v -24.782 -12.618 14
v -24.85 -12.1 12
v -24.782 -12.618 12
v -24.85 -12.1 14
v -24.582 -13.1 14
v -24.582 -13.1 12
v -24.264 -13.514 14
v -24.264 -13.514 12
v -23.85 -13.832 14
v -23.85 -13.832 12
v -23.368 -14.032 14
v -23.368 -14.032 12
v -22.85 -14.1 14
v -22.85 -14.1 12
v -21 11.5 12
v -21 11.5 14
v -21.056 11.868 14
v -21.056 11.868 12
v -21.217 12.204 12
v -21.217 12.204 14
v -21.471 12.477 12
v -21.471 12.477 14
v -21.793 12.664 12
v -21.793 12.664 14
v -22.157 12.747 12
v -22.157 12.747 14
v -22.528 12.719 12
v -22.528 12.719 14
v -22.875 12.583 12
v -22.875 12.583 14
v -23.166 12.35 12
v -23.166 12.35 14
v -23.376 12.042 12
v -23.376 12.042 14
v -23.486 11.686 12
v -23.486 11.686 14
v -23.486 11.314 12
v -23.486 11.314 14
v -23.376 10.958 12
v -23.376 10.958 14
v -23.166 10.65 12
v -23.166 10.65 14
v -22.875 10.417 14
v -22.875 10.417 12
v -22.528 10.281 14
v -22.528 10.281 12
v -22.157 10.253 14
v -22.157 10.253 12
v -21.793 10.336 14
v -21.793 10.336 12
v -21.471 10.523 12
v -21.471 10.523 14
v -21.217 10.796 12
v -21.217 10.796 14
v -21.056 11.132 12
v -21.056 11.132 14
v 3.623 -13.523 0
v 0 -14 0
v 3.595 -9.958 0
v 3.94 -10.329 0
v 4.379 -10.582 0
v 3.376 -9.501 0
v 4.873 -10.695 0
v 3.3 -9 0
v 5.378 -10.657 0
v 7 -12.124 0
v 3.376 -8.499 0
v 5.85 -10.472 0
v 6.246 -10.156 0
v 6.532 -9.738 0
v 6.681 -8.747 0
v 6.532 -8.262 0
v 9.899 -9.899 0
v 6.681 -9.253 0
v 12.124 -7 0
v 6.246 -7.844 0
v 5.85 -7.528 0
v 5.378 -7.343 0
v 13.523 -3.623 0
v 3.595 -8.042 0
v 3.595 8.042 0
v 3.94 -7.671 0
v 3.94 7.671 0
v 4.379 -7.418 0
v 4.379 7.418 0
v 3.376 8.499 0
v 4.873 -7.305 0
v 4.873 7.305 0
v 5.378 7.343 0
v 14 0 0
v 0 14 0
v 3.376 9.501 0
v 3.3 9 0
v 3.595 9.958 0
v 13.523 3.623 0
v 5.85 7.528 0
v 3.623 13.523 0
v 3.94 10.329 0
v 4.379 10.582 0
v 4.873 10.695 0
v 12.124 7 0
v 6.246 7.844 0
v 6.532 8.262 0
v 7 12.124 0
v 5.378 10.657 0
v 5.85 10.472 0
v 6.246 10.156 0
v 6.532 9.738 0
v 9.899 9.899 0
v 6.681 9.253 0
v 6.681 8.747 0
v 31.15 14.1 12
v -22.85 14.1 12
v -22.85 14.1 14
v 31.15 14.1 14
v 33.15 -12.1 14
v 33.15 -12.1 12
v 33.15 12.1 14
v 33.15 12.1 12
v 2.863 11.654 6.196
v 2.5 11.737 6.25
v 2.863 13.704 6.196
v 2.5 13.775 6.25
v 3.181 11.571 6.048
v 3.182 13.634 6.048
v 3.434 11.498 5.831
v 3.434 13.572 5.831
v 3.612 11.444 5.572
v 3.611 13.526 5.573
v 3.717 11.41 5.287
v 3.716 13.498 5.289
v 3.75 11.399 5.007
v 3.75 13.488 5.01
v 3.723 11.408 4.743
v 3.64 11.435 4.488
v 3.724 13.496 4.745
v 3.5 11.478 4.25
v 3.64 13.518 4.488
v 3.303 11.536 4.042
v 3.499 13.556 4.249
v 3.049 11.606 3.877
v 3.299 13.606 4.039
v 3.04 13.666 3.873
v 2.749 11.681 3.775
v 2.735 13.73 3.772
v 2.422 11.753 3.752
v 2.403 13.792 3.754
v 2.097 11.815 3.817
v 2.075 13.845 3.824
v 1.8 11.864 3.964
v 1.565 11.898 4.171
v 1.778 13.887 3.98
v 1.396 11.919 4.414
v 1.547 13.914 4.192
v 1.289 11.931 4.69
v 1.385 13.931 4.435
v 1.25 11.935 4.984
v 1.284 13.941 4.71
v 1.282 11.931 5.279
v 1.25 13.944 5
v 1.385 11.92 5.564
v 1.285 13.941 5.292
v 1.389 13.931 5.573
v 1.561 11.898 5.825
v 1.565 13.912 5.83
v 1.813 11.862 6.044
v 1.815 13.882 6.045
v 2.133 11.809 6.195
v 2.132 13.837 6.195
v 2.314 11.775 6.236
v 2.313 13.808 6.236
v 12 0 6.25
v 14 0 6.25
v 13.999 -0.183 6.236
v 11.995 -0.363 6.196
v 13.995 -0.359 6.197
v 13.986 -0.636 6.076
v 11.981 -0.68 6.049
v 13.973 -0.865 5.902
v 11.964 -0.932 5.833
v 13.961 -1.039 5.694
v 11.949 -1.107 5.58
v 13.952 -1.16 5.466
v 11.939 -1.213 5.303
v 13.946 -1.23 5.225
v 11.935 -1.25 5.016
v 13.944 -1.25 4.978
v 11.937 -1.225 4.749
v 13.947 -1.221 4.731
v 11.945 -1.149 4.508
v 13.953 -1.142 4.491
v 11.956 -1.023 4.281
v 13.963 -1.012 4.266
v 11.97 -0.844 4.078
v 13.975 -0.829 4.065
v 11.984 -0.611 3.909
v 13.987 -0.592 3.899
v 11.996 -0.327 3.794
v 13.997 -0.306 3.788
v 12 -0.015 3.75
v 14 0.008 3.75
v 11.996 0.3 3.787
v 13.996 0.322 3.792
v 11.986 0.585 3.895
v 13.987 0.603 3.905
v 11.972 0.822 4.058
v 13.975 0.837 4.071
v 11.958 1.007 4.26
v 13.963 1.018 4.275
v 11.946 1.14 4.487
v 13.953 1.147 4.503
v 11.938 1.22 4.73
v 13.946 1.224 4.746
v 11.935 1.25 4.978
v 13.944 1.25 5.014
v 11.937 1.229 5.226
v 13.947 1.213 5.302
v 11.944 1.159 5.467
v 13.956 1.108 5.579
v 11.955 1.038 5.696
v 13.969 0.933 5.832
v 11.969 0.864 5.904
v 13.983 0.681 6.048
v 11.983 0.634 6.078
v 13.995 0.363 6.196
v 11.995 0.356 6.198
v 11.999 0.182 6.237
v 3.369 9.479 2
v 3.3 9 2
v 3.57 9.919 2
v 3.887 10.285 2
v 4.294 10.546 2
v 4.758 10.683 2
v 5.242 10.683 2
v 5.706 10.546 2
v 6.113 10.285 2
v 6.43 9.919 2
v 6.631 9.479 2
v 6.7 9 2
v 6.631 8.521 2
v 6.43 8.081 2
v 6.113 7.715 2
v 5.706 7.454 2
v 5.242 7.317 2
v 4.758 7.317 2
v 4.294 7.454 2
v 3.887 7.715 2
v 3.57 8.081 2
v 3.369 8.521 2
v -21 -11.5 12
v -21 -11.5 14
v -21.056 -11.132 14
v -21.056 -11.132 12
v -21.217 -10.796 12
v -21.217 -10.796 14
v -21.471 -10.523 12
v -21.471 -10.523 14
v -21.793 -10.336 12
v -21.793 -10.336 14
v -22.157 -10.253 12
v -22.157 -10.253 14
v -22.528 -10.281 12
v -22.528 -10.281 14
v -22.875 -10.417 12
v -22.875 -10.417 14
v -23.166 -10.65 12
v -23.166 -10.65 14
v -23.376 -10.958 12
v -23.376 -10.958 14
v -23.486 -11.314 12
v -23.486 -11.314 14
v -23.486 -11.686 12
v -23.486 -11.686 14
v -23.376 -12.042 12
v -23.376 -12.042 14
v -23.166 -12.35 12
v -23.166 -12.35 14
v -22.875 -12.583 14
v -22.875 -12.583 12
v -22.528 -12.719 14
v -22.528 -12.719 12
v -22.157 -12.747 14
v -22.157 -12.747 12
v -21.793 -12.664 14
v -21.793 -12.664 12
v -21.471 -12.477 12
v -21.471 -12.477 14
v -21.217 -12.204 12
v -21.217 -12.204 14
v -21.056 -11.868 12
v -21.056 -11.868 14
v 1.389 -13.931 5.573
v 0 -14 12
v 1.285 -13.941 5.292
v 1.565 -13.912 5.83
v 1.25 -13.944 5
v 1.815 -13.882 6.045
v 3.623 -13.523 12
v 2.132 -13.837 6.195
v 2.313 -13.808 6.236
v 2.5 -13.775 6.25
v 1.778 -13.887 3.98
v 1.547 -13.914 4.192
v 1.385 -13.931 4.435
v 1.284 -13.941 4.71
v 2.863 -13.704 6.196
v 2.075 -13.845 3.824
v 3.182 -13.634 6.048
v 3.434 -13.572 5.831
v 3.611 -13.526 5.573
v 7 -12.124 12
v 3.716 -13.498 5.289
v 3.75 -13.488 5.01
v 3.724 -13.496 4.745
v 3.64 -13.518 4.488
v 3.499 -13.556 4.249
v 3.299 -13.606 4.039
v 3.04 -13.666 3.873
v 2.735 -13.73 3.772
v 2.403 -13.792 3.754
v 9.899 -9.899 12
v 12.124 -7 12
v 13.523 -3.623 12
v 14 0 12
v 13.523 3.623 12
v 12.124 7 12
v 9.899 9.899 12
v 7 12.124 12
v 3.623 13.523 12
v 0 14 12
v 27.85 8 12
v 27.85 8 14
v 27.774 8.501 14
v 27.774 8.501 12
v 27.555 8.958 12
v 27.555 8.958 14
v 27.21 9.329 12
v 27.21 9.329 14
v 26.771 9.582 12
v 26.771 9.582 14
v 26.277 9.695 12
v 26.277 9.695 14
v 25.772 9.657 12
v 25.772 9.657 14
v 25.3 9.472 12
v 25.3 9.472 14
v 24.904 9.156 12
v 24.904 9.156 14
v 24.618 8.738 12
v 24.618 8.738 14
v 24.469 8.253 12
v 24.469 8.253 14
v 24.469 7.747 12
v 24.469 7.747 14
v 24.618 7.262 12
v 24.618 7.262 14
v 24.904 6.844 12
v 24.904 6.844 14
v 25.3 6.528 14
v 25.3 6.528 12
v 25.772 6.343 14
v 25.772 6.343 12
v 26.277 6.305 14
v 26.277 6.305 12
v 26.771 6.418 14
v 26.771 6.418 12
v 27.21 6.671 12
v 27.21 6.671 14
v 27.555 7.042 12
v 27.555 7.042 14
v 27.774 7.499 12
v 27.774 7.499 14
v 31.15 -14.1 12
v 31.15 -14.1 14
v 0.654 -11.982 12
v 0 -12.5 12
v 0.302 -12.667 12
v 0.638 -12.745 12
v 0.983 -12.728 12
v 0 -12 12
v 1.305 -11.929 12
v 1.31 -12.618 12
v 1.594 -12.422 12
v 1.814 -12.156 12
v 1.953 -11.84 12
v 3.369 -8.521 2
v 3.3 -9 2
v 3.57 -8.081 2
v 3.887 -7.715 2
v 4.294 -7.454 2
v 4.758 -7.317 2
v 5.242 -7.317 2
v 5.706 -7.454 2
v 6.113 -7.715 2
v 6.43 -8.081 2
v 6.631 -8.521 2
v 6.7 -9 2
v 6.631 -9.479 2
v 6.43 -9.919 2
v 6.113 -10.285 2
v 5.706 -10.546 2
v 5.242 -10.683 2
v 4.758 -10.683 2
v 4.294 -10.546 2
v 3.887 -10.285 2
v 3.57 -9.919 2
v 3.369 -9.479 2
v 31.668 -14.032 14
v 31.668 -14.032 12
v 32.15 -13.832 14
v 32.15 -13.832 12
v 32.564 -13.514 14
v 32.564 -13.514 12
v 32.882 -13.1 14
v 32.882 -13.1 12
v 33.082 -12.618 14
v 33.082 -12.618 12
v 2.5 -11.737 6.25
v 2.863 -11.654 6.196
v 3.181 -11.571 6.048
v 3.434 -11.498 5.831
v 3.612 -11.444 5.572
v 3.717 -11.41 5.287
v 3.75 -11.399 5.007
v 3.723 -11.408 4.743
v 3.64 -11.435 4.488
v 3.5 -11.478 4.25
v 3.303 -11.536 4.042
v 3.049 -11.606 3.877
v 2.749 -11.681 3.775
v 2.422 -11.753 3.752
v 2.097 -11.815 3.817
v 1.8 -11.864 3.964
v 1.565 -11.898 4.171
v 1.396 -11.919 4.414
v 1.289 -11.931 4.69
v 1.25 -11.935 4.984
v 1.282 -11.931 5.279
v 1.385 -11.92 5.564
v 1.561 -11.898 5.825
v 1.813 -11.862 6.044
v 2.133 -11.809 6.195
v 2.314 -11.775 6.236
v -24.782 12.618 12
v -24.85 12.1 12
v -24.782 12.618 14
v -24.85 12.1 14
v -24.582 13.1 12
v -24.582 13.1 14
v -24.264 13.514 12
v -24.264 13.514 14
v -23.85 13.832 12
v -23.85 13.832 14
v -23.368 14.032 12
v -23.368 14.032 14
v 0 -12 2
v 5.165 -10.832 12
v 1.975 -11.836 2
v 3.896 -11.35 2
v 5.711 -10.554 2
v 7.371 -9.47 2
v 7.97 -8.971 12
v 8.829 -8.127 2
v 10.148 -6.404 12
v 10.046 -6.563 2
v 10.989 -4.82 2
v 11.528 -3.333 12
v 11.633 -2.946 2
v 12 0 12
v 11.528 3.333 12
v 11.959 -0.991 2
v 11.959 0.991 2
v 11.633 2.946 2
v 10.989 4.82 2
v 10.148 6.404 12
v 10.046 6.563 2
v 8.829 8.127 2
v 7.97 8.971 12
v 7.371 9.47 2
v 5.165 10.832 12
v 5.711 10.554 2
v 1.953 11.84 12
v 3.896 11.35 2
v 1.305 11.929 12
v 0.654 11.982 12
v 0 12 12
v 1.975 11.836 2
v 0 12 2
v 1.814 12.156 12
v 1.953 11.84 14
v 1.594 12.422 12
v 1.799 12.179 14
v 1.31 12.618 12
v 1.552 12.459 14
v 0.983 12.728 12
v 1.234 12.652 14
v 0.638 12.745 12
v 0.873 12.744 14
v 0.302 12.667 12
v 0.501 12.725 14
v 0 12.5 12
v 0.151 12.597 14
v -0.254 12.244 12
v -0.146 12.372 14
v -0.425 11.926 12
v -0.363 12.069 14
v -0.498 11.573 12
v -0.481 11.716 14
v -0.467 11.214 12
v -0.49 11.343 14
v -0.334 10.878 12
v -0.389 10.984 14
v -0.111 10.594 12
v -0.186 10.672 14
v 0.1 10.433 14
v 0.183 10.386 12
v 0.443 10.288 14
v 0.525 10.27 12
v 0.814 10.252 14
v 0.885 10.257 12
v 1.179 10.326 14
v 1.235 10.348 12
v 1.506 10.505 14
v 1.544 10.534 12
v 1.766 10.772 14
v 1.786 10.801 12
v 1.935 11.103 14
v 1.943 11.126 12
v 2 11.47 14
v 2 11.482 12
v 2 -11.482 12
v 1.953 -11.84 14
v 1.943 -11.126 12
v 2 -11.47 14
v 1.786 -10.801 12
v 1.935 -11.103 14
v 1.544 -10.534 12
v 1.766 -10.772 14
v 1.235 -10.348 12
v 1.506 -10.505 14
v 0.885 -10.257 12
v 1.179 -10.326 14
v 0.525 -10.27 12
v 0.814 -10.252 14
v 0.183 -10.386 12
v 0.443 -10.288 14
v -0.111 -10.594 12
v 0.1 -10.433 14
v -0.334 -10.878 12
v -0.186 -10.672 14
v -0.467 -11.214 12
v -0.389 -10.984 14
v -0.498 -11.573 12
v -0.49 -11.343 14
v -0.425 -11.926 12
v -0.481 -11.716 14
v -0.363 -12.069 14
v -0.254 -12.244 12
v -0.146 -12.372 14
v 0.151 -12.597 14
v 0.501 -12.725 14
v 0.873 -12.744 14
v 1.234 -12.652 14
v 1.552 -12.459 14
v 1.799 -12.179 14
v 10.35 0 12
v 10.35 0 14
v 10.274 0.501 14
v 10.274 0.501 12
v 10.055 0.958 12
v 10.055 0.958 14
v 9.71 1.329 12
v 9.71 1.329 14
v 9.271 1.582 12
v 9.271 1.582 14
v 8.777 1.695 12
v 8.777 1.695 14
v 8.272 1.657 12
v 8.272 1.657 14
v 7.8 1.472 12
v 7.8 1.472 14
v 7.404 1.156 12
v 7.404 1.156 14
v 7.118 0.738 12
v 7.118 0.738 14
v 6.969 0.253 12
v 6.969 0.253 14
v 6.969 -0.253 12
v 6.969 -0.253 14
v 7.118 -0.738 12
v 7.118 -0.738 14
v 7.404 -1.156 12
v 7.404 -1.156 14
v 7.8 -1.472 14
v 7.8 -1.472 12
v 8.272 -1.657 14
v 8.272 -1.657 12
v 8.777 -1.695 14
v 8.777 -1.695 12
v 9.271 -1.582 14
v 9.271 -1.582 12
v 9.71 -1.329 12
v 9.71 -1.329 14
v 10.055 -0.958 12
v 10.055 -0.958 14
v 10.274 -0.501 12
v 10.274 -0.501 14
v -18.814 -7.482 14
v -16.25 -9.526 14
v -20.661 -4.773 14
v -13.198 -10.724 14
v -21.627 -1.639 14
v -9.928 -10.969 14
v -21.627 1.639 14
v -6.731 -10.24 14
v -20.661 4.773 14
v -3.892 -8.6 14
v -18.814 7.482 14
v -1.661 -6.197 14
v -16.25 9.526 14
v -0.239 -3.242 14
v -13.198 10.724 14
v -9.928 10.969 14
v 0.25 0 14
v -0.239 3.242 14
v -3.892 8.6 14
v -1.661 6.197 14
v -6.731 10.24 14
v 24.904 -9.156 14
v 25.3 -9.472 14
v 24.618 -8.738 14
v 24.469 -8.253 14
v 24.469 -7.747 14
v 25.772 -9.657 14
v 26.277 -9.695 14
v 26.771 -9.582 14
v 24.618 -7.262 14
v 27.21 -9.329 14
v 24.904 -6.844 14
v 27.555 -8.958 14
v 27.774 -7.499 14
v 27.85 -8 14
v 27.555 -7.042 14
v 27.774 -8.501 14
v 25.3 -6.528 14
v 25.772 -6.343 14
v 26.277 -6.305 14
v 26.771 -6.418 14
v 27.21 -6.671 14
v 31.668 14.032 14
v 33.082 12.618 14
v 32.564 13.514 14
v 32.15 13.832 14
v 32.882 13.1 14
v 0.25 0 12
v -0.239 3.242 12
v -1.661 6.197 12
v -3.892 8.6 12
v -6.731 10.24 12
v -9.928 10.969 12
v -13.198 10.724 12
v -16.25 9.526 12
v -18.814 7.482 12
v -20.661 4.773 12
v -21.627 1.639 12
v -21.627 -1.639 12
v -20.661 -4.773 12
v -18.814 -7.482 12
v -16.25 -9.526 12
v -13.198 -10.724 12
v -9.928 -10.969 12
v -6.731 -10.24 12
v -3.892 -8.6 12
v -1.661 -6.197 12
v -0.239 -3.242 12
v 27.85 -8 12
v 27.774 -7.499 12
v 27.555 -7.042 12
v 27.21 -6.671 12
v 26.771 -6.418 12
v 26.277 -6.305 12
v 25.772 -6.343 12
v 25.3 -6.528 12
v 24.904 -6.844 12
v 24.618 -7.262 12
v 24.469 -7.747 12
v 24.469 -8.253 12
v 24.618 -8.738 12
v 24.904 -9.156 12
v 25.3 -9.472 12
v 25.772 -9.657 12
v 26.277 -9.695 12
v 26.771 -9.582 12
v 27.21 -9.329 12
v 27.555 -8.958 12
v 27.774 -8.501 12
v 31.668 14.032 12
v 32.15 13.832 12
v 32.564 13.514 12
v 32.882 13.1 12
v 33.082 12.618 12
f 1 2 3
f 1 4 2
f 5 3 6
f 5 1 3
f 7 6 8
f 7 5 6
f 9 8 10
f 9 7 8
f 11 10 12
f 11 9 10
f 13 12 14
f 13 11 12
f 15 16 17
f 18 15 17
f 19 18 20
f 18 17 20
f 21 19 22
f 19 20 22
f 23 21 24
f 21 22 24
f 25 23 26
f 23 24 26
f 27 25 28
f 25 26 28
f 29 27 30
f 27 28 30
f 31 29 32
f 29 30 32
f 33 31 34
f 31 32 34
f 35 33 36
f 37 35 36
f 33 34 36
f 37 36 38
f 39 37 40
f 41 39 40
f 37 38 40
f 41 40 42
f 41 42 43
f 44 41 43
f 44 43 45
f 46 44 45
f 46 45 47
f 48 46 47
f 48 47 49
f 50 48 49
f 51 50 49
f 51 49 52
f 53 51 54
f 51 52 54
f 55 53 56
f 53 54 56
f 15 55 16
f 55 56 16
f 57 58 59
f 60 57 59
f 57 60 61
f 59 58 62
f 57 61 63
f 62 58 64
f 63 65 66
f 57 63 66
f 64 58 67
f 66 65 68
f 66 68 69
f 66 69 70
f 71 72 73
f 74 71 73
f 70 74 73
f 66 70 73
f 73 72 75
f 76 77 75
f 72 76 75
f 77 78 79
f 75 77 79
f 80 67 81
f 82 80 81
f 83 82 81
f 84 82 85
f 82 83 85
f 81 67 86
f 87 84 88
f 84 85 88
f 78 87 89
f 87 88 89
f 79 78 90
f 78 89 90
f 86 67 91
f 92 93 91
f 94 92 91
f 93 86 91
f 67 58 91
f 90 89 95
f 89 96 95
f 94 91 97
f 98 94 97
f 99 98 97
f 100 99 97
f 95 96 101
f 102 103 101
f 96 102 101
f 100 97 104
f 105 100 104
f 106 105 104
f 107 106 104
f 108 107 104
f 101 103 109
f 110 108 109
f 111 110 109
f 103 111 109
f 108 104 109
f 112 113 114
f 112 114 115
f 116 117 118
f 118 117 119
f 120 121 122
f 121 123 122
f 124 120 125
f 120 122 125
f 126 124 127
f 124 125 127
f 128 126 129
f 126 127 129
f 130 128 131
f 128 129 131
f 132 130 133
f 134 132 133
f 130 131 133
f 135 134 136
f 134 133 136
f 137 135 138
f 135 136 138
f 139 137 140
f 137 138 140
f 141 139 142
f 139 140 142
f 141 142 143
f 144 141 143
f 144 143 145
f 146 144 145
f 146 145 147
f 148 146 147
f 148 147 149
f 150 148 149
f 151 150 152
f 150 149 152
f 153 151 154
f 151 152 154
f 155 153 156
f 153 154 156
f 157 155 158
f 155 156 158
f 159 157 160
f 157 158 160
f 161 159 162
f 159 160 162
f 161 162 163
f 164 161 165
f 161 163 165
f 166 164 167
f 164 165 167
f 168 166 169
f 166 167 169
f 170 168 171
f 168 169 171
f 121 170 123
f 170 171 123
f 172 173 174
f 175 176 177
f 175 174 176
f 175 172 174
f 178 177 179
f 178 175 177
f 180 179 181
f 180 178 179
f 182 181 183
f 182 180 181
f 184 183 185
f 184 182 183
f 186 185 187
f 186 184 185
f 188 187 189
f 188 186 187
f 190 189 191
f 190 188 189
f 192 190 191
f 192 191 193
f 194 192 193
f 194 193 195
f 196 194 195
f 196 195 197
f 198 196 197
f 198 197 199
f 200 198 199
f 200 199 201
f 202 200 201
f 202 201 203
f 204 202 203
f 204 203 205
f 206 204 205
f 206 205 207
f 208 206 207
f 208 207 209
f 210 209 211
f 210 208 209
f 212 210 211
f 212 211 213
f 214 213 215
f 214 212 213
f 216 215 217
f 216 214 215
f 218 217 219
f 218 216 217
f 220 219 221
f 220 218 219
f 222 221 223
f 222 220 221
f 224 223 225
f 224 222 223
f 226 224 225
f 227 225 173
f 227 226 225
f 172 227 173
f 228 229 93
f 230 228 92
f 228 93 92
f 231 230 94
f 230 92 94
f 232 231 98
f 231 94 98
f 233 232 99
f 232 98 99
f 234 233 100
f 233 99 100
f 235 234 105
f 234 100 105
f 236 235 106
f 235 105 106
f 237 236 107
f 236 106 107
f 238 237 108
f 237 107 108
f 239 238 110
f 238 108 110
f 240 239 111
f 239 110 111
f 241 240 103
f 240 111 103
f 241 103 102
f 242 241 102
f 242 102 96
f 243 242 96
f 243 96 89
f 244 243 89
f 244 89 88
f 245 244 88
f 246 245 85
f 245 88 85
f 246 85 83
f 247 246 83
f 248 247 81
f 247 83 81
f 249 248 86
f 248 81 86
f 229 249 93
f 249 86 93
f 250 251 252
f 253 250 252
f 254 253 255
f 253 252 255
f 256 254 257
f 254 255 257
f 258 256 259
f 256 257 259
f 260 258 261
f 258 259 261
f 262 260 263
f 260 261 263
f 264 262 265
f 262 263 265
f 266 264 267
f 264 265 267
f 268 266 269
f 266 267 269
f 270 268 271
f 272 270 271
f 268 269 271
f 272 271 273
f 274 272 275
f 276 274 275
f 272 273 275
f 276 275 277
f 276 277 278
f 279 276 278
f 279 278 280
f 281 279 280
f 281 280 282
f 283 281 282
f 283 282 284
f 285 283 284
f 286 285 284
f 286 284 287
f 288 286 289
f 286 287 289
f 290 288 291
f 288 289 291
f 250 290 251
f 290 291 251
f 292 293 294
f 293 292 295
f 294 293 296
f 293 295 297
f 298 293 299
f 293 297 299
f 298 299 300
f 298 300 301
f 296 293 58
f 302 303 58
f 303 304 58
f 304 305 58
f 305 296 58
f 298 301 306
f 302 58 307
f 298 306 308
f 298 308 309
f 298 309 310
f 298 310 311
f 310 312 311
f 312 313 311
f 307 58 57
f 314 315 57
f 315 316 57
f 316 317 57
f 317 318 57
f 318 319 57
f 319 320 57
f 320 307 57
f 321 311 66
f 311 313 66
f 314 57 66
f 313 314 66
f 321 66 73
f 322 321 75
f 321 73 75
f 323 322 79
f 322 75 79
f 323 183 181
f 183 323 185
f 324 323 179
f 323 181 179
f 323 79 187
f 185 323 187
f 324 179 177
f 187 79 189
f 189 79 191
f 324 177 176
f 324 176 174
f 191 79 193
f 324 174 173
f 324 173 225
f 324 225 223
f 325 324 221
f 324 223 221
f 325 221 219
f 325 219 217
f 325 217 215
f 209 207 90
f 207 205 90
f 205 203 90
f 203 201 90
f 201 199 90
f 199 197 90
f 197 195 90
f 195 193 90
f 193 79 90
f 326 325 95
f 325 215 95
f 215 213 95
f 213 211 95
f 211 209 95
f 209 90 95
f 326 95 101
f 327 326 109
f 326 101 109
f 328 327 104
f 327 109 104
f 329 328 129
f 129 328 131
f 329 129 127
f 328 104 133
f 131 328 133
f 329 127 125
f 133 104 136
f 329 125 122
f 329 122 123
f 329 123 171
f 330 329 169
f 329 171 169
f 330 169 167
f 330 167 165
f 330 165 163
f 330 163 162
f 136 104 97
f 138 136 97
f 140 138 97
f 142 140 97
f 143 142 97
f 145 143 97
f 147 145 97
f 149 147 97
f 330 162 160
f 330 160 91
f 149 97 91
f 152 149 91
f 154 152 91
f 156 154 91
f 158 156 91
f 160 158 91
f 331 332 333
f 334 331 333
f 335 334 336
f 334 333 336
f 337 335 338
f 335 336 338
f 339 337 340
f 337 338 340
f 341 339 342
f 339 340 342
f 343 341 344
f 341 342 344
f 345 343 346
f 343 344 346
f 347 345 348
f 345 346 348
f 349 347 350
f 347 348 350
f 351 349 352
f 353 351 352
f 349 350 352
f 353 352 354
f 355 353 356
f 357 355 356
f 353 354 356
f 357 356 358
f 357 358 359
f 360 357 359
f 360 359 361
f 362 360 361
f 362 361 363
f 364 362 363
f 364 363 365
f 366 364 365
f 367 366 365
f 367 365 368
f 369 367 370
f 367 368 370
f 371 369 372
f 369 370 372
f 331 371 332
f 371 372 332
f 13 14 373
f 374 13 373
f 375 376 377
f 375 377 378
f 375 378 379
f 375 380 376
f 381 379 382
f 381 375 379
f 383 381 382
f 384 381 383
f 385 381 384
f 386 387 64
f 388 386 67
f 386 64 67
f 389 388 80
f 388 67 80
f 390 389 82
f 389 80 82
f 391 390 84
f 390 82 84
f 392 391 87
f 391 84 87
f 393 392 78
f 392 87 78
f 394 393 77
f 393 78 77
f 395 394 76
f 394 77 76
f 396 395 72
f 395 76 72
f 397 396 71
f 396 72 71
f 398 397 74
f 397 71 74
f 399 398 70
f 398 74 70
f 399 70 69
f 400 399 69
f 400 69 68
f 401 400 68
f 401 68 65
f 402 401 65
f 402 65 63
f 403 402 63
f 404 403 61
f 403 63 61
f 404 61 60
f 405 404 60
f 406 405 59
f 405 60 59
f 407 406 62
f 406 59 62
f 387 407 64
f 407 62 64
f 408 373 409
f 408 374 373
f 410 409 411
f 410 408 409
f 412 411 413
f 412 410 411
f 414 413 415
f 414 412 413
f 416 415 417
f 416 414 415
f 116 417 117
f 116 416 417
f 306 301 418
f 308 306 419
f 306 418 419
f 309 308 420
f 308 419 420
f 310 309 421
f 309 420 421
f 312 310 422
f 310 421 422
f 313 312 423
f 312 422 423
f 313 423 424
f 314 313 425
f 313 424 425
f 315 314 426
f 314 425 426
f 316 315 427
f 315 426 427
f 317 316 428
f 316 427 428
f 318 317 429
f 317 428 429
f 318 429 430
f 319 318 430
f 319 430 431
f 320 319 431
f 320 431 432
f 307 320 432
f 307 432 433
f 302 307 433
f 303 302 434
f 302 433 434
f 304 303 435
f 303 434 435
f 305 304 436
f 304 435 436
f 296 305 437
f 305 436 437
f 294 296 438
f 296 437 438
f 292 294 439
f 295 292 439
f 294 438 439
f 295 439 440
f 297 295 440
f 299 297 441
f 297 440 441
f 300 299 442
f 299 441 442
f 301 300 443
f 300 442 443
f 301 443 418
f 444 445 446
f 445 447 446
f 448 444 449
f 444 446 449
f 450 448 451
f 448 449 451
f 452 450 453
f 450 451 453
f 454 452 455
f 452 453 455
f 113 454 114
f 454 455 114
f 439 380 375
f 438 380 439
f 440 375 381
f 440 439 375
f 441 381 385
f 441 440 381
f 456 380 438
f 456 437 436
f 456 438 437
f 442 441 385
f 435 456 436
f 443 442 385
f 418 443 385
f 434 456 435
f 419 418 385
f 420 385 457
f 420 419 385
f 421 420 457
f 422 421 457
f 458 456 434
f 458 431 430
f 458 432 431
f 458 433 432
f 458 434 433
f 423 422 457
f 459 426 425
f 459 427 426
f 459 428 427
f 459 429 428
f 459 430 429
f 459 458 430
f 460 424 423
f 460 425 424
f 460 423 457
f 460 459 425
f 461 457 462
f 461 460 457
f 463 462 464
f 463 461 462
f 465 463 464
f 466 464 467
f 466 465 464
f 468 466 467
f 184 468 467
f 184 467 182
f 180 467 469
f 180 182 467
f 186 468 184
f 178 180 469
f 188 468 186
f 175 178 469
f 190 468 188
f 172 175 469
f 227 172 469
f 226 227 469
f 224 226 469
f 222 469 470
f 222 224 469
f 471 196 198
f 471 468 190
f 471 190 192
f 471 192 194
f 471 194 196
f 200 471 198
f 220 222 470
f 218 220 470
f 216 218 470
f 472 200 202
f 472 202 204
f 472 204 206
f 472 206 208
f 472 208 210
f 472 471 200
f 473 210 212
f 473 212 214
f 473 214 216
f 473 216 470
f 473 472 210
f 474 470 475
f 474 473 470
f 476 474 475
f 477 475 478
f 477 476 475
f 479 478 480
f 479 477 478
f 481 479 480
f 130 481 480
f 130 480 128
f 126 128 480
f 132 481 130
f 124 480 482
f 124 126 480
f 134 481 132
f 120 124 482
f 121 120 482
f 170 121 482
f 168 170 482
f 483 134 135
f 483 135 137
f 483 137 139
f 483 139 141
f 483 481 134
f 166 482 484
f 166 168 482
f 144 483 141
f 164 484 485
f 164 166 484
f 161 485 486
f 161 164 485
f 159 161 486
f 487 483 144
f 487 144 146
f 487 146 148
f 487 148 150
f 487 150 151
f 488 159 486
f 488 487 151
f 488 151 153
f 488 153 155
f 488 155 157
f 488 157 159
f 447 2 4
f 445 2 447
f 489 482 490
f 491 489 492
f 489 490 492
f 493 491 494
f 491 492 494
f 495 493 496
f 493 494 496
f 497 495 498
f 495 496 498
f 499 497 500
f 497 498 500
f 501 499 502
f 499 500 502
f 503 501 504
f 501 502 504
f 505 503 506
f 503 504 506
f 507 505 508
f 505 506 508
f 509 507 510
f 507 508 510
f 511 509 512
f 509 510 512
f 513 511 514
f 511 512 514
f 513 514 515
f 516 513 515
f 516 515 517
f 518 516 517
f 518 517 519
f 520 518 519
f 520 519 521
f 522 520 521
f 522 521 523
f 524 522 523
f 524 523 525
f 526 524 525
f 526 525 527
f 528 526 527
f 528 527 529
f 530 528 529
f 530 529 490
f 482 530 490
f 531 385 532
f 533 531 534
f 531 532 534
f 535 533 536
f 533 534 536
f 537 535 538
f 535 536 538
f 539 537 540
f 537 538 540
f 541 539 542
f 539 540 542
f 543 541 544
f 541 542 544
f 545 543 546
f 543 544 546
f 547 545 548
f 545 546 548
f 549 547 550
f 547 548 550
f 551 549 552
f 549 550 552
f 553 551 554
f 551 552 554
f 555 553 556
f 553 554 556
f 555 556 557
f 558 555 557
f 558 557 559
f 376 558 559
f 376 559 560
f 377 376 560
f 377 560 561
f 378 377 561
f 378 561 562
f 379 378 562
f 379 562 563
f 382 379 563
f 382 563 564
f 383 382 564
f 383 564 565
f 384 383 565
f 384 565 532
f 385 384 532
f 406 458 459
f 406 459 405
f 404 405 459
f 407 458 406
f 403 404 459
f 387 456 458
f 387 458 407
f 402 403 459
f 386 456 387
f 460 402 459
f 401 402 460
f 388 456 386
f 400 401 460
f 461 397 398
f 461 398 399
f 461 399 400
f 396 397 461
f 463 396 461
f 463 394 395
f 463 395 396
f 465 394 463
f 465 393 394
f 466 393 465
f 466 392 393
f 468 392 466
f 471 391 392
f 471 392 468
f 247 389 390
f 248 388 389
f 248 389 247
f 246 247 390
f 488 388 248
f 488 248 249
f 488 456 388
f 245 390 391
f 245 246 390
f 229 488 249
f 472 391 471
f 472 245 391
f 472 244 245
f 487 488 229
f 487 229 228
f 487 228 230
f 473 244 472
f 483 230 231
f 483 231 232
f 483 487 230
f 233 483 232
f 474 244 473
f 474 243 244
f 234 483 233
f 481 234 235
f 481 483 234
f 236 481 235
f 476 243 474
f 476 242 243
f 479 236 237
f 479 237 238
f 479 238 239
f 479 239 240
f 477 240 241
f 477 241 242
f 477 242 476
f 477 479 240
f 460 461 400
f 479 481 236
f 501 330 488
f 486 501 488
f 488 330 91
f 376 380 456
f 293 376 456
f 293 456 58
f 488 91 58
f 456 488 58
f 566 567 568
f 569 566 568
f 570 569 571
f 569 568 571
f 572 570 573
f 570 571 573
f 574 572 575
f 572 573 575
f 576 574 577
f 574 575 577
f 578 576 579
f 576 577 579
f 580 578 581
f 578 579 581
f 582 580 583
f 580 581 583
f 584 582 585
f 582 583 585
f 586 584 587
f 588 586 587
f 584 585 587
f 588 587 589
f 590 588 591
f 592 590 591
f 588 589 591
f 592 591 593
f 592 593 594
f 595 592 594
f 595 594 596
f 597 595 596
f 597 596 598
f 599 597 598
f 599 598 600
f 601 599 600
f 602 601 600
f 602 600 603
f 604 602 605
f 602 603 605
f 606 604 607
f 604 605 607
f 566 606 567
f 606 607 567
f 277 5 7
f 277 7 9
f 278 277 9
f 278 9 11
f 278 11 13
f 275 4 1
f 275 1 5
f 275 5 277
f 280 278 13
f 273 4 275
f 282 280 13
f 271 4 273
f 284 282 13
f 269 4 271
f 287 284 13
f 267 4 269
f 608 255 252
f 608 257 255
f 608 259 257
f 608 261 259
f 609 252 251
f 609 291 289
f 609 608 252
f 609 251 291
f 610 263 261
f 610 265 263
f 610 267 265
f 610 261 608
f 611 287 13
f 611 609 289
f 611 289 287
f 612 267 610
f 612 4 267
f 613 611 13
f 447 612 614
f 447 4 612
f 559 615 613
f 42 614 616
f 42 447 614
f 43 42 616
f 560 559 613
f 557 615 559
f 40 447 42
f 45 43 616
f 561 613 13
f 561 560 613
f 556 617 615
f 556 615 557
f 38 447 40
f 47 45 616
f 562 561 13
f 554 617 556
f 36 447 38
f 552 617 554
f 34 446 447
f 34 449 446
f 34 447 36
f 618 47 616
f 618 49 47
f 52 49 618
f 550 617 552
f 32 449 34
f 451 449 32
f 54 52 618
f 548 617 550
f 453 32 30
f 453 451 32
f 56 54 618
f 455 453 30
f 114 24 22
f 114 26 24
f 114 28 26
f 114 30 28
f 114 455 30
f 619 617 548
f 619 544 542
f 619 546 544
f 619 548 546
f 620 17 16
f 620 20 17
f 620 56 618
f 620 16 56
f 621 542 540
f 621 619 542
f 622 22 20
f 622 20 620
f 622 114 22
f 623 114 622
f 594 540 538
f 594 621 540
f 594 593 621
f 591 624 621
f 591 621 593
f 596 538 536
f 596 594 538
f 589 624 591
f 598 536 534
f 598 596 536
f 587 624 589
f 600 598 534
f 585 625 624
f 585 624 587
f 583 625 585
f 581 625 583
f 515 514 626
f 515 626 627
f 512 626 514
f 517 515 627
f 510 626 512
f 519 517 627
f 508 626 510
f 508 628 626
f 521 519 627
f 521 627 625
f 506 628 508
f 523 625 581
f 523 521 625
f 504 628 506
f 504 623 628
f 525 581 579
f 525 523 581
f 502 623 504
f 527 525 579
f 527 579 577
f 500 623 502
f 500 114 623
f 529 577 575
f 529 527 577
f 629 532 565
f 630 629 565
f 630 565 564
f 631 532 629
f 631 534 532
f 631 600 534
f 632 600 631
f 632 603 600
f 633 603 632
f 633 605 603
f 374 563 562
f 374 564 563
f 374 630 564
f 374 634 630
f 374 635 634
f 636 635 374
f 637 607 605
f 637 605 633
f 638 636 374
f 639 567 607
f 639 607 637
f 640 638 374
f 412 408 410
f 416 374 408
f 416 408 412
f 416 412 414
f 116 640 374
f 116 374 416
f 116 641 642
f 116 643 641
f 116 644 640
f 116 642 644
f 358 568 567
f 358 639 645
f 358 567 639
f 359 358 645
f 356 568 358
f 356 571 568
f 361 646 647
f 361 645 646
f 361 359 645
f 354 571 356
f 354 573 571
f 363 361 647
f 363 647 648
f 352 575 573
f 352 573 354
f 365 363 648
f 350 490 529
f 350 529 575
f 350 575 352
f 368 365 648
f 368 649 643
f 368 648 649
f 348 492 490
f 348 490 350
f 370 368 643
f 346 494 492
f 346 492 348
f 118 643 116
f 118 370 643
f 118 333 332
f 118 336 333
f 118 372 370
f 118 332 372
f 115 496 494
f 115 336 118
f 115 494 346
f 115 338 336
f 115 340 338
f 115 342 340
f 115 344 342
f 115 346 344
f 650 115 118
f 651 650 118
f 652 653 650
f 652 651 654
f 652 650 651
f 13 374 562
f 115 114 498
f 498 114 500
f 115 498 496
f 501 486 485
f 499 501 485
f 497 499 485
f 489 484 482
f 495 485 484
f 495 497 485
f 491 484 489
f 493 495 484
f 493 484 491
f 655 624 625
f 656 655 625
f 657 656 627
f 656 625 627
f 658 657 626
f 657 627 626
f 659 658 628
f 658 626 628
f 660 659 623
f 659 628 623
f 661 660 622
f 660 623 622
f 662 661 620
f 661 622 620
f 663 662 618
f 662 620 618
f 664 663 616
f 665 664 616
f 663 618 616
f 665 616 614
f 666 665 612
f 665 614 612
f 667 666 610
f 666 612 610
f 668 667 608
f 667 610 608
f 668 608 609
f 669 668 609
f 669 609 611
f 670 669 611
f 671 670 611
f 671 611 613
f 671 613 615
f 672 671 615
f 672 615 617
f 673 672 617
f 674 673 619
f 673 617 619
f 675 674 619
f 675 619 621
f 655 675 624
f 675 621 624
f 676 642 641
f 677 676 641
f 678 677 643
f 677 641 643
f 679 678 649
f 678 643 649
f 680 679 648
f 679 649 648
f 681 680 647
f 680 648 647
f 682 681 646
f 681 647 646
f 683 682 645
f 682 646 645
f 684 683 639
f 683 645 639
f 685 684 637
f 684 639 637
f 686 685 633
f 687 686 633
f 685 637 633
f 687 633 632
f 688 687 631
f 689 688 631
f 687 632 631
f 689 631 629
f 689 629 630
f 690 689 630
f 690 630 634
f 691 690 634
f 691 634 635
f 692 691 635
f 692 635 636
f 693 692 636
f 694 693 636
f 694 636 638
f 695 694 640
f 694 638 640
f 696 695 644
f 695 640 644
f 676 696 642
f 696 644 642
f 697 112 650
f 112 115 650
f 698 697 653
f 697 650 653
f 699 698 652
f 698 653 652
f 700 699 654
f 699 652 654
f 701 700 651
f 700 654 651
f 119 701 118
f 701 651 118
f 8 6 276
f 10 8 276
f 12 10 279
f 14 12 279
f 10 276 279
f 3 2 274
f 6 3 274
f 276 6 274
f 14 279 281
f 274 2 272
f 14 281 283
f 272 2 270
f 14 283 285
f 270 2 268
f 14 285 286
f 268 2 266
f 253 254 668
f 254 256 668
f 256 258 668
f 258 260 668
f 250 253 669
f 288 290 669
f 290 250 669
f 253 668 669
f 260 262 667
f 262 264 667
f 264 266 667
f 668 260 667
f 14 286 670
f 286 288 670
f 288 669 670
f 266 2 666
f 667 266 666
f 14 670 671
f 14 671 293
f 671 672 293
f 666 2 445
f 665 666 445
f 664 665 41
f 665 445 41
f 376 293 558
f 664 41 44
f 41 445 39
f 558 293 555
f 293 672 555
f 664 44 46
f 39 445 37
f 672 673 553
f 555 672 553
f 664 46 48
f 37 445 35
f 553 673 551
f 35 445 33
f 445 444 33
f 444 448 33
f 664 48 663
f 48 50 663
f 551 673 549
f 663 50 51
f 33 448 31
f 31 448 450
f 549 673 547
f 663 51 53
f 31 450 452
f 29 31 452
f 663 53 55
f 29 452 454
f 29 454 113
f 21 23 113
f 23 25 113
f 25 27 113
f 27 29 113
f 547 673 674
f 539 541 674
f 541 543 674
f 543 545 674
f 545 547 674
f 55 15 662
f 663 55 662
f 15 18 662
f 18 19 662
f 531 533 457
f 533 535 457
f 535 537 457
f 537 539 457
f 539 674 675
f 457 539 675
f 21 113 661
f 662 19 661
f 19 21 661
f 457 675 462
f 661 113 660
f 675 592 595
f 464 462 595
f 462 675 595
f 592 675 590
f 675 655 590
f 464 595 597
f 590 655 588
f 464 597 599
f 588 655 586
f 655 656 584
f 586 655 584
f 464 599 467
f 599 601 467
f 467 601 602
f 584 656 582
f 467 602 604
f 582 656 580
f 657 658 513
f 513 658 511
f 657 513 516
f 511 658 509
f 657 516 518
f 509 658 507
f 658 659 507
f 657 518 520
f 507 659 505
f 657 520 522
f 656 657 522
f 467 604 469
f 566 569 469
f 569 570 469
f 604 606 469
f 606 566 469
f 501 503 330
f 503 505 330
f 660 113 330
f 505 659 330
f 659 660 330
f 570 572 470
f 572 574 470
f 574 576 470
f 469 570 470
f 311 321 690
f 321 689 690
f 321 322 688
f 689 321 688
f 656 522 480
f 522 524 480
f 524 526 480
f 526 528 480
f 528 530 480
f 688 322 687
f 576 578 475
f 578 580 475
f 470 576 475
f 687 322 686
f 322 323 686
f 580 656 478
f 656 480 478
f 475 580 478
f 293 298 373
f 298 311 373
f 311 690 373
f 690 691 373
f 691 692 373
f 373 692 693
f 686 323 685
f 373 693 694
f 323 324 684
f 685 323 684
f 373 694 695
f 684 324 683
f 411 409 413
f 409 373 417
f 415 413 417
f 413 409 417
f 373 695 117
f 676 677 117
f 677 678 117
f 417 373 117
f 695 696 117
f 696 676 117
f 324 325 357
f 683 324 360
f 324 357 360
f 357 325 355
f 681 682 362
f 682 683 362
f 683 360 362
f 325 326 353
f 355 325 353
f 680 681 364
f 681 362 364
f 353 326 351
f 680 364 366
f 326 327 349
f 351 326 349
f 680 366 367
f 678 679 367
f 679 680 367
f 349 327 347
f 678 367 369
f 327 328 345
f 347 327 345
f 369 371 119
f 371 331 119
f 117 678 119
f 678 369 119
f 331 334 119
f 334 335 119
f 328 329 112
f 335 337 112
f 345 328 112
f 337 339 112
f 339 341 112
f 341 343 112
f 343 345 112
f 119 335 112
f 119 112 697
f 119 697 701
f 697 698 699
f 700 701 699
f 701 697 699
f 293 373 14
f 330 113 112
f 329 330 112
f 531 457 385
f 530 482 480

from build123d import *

# Parameters (mm, degrees)
BOSS_EXTRUDE1_DEPTH = 12
SKETCH2_W           = 58
SKETCH2_H           = 28.2
BOSS_EXTRUDE2_DEPTH = 2
SHELL2_START        = 2
SHELL2_DEPTH        = 10
SKETCH3_R           = 11
SKETCH3_R_2         = 1.25
CUT_EXTRUDE1_DEPTH  = 2
FILLET1_R           = 2
SKETCH4_R           = 1.7
CUT_EXTRUDE2_DEPTH  = 2
SKETCH5_R           = 1.7
CUT_EXTRUDE3_DEPTH  = 2
SKETCH7_R           = 1.25
CUT_EXTRUDE6_DEPTH  = 14
SKETCH8_R           = 1.25
CUT_EXTRUDE7_DEPTH  = 17


# Read off the part's stored shape, not the designer's step: Shell2
with BuildPart() as part:
    # Sketch1 → Boss-Extrude1 (new body)
    with BuildSketch(Plane.XY):
        with BuildLine():
            Line((0, 14), (0, -14))
            ThreePointArc((0, -14), (14, 0), (0, 14))
        make_face()
    extrude(amount=BOSS_EXTRUDE1_DEPTH)

    # Sketch2 → Boss-Extrude2 (add)
    with BuildSketch(Plane.XY.offset(12)):
        with Locations((4.15, 0)):
            Rectangle(SKETCH2_W, SKETCH2_H)
    extrude(amount=BOSS_EXTRUDE2_DEPTH)

    # Shell2 outline → Shell2 (cut)
    with BuildSketch(Plane.XY.offset(SHELL2_START)):
        with BuildLine():
            ThreePointArc((0, -12), (12, 0), (0, 12))
            Line((0, 12), (0, -12))
        make_face()
    extrude(amount=SHELL2_DEPTH, mode=Mode.SUBTRACT)

    # Sketch3 → Cut-Extrude1 (cut)
    with BuildSketch(Plane.XY.offset(14)):
        with Locations((-10.75, 0)):
            Circle(SKETCH3_R)
        with Locations((-22.25, 11.5)):
            Circle(SKETCH3_R_2)
        with Locations((-22.25, -11.5)):
            Circle(SKETCH3_R_2)
        with Locations(Location((0.75, -11.5, 0), (0, 0, 344.215225354))):
            Circle(SKETCH3_R_2)
        with Locations(Location((0.75, 11.5, 0), (0, 0, 15.784774646))):
            Circle(SKETCH3_R_2)
    extrude(amount=-CUT_EXTRUDE1_DEPTH, mode=Mode.SUBTRACT)

    # Fillet1
    fillet1_edges = [part.edges().sort_by_distance(p)[0] for p in [
        (-24.85, 14.1, 13),
        (-24.85, -14.1, 13),
        (33.15, -14.1, 13),
        (33.15, 14.1, 13),
    ]]
    fillet(fillet1_edges, radius=FILLET1_R)

    # Sketch4 → Cut-Extrude2 (cut)
    with BuildSketch(Plane.XY.offset(14)):
        with Locations((26.15, 8)):
            Circle(SKETCH4_R)
        with Locations((26.15, -8)):
            Circle(SKETCH4_R)
        with Locations((8.65, 0)):
            Circle(SKETCH4_R)
    extrude(amount=-CUT_EXTRUDE2_DEPTH, mode=Mode.SUBTRACT)

    # Sketch5 → Cut-Extrude3 (cut)
    with BuildSketch(Plane(origin=(0, 0, 0), x_dir=(-1, 0, 0), z_dir=(0, 0, -1))):
        with Locations((-5, -9)):
            Circle(SKETCH5_R)
        with Locations((-5, 9)):
            Circle(SKETCH5_R)
    extrude(amount=-CUT_EXTRUDE3_DEPTH, mode=Mode.SUBTRACT)

    # Sketch7 → Cut-Extrude6 (cut)
    with BuildSketch(Plane(origin=(0, 0, 0), x_dir=(0, 0, -1), z_dir=(1, 0, 0))):
        with Locations(Location((-5, 0, 0), (0, 0, 180))):
            Circle(SKETCH7_R)
    extrude(amount=CUT_EXTRUDE6_DEPTH, mode=Mode.SUBTRACT)

    # Sketch8 → Cut-Extrude7 (cut, symmetric)
    with BuildSketch(Plane(origin=(0, 0, 0), x_dir=(1, 0, 0), z_dir=(0, 1, 0))):
        with Locations(Location((2.5, -5, 0), (0, 0, 270))):
            Circle(SKETCH8_R)
    extrude(amount=CUT_EXTRUDE7_DEPTH, both=True, mode=Mode.SUBTRACT)


solid = part.part
